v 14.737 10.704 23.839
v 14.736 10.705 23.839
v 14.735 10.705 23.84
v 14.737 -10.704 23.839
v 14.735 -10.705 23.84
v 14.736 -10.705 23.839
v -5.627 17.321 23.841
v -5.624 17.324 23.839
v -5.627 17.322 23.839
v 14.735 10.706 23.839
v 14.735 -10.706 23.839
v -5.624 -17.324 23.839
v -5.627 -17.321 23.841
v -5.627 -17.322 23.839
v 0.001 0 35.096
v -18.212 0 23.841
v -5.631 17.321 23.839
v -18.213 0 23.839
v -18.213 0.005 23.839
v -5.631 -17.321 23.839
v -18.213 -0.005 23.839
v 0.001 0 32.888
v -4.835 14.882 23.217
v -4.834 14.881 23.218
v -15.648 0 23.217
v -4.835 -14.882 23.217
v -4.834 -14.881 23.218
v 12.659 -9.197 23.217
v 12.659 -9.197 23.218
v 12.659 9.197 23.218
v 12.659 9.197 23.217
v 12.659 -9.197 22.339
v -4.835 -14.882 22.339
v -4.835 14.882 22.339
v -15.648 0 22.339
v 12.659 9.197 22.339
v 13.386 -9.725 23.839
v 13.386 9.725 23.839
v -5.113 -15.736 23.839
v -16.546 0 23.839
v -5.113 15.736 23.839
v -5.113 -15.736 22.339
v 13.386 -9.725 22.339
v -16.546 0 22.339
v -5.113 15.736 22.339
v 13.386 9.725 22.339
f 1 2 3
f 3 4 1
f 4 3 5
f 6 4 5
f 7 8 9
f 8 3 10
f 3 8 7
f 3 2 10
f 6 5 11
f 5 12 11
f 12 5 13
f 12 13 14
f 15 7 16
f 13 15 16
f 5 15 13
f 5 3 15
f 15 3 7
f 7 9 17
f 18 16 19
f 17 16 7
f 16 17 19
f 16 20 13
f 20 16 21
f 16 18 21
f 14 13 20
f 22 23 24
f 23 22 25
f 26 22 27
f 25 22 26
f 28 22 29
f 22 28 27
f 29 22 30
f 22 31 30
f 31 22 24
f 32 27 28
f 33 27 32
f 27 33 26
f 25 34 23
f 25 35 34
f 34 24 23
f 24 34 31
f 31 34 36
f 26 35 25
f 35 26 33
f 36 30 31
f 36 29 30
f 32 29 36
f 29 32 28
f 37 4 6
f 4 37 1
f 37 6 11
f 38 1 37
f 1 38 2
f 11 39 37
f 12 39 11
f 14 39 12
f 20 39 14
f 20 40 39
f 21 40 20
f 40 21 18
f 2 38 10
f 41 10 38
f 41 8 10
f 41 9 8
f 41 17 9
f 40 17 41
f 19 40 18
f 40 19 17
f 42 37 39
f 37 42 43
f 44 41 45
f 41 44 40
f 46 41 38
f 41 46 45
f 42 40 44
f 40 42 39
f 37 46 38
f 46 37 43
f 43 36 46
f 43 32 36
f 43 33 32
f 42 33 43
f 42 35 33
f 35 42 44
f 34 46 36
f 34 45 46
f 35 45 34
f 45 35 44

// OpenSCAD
arete = 21.409;
creux = 1; // creux ou plein || 1 ou 0
paroi = 1.5;
echelleReductionAjustementBouchon = 0.972;
bouchon = 1; // 1 ou 0
corps = 0; // 1 ou 0

// Controle rotation viewport quand animation en route
//$vpr = [70, 0, $t * 180];

/* Forme
Choix parmi:
- 0 => Etoilé
- 1 => Christique
- 2 => Christique_inversé
- 3 => Pentakis // (all points on sphere)
- 4 => Animate // voir plus bas pour plus d'infos
*/
forme_ID = 1;

/////////

function dodeca_ext_radius(a) = 
    a/2*(sqrt(2));
    
function dodeca_sphere_inscrite_radius(a) = 
    a*sqrt(5/8+11/(8*sqrt(5)));
    
function dodeca_arete_from_sphere_inscrite(radius) = 
    radius/sqrt(5/8+11/(8*sqrt(5)));

areteInt = dodeca_arete_from_sphere_inscrite(
            dodeca_sphere_inscrite_radius(arete)-paroi);

echo("arete int: ", areteInt);

spike = [
    2.3417, // Etoilé, scale 1 is arete = 1.236 mm, diametre = 6.24 mm, arete pyramide = 2 mm
    0.8944, // Christique, scale 1 is arete = 1.236 mm, diametre = 4.05 mm
    -0.8944, // Christique inversé
    0.4279 // Pentakis
];

if (forme_ID == 4) {
    Animate();
} else {  
    if (creux == 0) {
        small_stellated_dodecahedron(spike[forme_ID], small_stellated_dodecahedron);
    } else {
        if (corps == 1) {
            corps_ouvert();
        }
        if (bouchon == 1) {
            bouchon();
        }
    }
}


//		poly_creux();
//		decoupe_bouchon();

module corps_ouvert() {
    rotate([180, 0, 0])
	difference() {
		poly_creux();
		decoupe_bouchon();
	}
}

module poly_creux() {
    difference() {
        small_stellated_dodecahedron(spike[forme_ID], arete);
        small_stellated_dodecahedron(spike[forme_ID], areteInt);
    }
}

module decoupe_bouchon(scale=1) {
    distance = dodeca_sphere_inscrite_radius(arete);
	rotate([0,0,36]) translate([0,0, distance])
		cylinder(99, r=arete*0.853, $fn=5, center=false);
	rotate([0,0,36]) translate([0,0, distance-paroi])
		cylinder(paroi, r=(arete-paroi)*0.855*scale, $fn=5, center=false);
}

module supplement_feuillure_bouchon() {
    distance = dodeca_sphere_inscrite_radius(arete);
    rotate([0,0,36]) translate([0,0, distance-paroi-1])
    difference() {   
		cylinder(paroi+1, r=(arete-paroi)*0.85, $fn=5, center=false);
		cylinder(paroi+1, r=(arete-2*paroi)*0.85, $fn=5, center=false);
    }
}

module bouchon() {
//	scale([echelleReductionAjustementBouchon, echelleReductionAjustementBouchon, 0.995])
	difference () {
        intersection() {
            union() {
                poly_creux();
                supplement_feuillure_bouchon();
            }
            decoupe_bouchon(echelleReductionAjustementBouchon);
        }
	}
}

// }}

/*
animates the single parameter of the
module small_stellated_dodecahedron

1/ choose animate in the view menu
2/ sets fps to an appropiate number for
your machine - 20 is good
3/ set steps to a number that keeps the
change from happening too slowly or
too fast - 200 is good
*/
module Animate() {
    small_stellated_dodecahedron(-3.4317*abs(2*$t-1)+2.4317);
}

// Étoilé
// scale 1 is arete = 1.236 mm, diametre = 6.24 mm, arete pyramide = 2 mm
module Etoile(a) {
    small_stellated_dodecahedron(2.3417, a);
}

// Christique
// scale 1 is arete = 1.236 mm, diametre = 4.05 mm
module Christique(a) {
    small_stellated_dodecahedron(0.8944, a);
}

// Christique inversé
module Christique_inv(a) {
    small_stellated_dodecahedron(-0.8944, a);
}

// Pentakis (all points on sphere)
module Pentakis(a) {
    small_stellated_dodecahedron(0.4279, a);
}

module small_stellated_dodecahedron(scale, ar)
{
a=scale*0.61803;
b=scale*0.38197;
    
length = ar ? ar : arete;
echo("length:", length);
// scale(1) => arete 1.236 mm
scale(length/1.236)

// Posé sur 3 pointes
//rotate([20.91, 0, 0])

// Posé sur 1 pointe
rotate([0, 31.72, 0])

/*
constructed from 12 pentagonal pyramids placed
on the faces of a dodecahedron.
first 20 points are the vertices of a dodecahedron
next 12 points are the vertices of the centers
of the faces of the dodecahedron

if scale = 0 a dodecahedron is created

if scale is positive the centers of the
faces are moved out fron the center of the
dodecahedron

if scale is negative the centers of the
faces are moved in towards the center of the
dodecahedron

the apex angles of the triangles that make up
the faces of the stellated dodecahedron
are 36 degrees - the scale factor that
makes a small stellated dodecahedron
is approximately 2.3417
length of side of pentagonal pyramid for
small stellated dodecahedron = 2

the apex angles of the triangles that make up
the faces of a pentakis dodecahedron ( one of
the Catalan solids) are about 68.619 degrees
the scale factor to make one is ca 0.4279

if len = length of the sides of the
pentagonal pyramid then approximately

scale = + or - sqrt((len*len/0.52786) - 2.09443)

lengths of the sides of the base are sqrt(5)-1
or 1.23607 to make equilateral triangles scale
factor is 0.8944

distance from centers of faces to origin ca 1.37638
distance from dodecahedral points to origin sqrt(3)




pcm

*/

polyhedron
       (points = [
                 [   1.00000,   1.00000,   1.00000],
                 [   1.00000,   1.00000,  -1.00000],
                 [   1.00000,  -1.00000,   1.00000],
                 [   1.00000,  -1.00000,  -1.00000],
                 [  -1.00000,   1.00000,   1.00000],
                 [  -1.00000,   1.00000,  -1.00000],
                 [  -1.00000,  -1.00000,   1.00000],
                 [  -1.00000,  -1.00000,  -1.00000],
                 [   0.00000,   0.61803,   1.61803],
                 [   0.00000,   0.61803,  -1.61803],
                 [   0.00000,  -0.61803,   1.61803],
                 [   0.00000,  -0.61803,  -1.61803],
                 [   0.61803,   1.61803,   0.00000],
                 [   0.61803,  -1.61803,   0.00000],
                 [  -0.61803,   1.61803,   0.00000],
                 [  -0.61803,  -1.61803,   0.00000],
                 [   1.61803,   0.00000,   0.61803],
                 [   1.61803,   0.00000,  -0.61803],
                 [  -1.61803,   0.00000,   0.61803],
                 [  -1.61803,   0.00000,  -0.61803],
                 [   1.17082+a,   0.72361+b,   0.00000],
                 [   0.72361+b,   0.00000,   1.17082+a],
                 [   0.00000,   1.17082+a,   0.72361+b],
                 [   0.00000,   1.17082+a,  -0.72361-b],
                 [   0.72361+b,   0.00000,  -1.17082-a],
                 [   1.17082+a,  -0.72361-b,   0.00000],
                 [   0.00000,  -1.17082-a,   0.72361+b],
                 [   0.00000,  -1.17082-a,  -0.72361-b],
                 [  -0.72361-b,   0.00000,   1.17082+a],
                 [  -1.17082-a,   0.72361+b,   0.00000],
                 [  -0.72361-b,   0.00000,  -1.17082-a],
                 [  -1.17082-a,  -0.72361-b,   0.00000],
                   ],

           faces = [

                [0,20,16],[16,20,17],[17,20,1],
                [1,20,12],[12,20,0],
                [0,21,8],[8,21,10],[10,21,2],
                [2,21,16],[16,21,0],
                 [0,22,12],[12,22,14],[14,22,4],
                [4,22,8],[8,22,0],
                [1,23,9],[9,23,5],[5,23,14],
                [14,23,12],[12,23,1],
                [1,24,17],[17,24,3],[3,24,11],
                [11,24,9],[9,24,1],
                [16,25,2],[17,25,16],[3,25,17],
                 [13,25,3],[2,25,13],
                 [2,26,10],[10,26,6],[6,26,15],
                 [15,26,13],[13,26,2],
                 [3,27,13],[13,27,15],[15,27,7],
                 [7,27,11],[11,27,3],
                [4,28,18],[18,28,6],[6,28,10],
                 [10,28,8],[8,28,4],
                 [4,29,14],[14,29,5],[5,29,19],
                 [19,29,18],[18,29,4],
                  [5,30,9],[9,30,11],[11,30,7],
                 [7,30,19],[19,30,5],
                 [6,31,18],[18,31,19],[19,31,7],
                 [7,31,15],[15,31,6],

                 ]
      );
}
